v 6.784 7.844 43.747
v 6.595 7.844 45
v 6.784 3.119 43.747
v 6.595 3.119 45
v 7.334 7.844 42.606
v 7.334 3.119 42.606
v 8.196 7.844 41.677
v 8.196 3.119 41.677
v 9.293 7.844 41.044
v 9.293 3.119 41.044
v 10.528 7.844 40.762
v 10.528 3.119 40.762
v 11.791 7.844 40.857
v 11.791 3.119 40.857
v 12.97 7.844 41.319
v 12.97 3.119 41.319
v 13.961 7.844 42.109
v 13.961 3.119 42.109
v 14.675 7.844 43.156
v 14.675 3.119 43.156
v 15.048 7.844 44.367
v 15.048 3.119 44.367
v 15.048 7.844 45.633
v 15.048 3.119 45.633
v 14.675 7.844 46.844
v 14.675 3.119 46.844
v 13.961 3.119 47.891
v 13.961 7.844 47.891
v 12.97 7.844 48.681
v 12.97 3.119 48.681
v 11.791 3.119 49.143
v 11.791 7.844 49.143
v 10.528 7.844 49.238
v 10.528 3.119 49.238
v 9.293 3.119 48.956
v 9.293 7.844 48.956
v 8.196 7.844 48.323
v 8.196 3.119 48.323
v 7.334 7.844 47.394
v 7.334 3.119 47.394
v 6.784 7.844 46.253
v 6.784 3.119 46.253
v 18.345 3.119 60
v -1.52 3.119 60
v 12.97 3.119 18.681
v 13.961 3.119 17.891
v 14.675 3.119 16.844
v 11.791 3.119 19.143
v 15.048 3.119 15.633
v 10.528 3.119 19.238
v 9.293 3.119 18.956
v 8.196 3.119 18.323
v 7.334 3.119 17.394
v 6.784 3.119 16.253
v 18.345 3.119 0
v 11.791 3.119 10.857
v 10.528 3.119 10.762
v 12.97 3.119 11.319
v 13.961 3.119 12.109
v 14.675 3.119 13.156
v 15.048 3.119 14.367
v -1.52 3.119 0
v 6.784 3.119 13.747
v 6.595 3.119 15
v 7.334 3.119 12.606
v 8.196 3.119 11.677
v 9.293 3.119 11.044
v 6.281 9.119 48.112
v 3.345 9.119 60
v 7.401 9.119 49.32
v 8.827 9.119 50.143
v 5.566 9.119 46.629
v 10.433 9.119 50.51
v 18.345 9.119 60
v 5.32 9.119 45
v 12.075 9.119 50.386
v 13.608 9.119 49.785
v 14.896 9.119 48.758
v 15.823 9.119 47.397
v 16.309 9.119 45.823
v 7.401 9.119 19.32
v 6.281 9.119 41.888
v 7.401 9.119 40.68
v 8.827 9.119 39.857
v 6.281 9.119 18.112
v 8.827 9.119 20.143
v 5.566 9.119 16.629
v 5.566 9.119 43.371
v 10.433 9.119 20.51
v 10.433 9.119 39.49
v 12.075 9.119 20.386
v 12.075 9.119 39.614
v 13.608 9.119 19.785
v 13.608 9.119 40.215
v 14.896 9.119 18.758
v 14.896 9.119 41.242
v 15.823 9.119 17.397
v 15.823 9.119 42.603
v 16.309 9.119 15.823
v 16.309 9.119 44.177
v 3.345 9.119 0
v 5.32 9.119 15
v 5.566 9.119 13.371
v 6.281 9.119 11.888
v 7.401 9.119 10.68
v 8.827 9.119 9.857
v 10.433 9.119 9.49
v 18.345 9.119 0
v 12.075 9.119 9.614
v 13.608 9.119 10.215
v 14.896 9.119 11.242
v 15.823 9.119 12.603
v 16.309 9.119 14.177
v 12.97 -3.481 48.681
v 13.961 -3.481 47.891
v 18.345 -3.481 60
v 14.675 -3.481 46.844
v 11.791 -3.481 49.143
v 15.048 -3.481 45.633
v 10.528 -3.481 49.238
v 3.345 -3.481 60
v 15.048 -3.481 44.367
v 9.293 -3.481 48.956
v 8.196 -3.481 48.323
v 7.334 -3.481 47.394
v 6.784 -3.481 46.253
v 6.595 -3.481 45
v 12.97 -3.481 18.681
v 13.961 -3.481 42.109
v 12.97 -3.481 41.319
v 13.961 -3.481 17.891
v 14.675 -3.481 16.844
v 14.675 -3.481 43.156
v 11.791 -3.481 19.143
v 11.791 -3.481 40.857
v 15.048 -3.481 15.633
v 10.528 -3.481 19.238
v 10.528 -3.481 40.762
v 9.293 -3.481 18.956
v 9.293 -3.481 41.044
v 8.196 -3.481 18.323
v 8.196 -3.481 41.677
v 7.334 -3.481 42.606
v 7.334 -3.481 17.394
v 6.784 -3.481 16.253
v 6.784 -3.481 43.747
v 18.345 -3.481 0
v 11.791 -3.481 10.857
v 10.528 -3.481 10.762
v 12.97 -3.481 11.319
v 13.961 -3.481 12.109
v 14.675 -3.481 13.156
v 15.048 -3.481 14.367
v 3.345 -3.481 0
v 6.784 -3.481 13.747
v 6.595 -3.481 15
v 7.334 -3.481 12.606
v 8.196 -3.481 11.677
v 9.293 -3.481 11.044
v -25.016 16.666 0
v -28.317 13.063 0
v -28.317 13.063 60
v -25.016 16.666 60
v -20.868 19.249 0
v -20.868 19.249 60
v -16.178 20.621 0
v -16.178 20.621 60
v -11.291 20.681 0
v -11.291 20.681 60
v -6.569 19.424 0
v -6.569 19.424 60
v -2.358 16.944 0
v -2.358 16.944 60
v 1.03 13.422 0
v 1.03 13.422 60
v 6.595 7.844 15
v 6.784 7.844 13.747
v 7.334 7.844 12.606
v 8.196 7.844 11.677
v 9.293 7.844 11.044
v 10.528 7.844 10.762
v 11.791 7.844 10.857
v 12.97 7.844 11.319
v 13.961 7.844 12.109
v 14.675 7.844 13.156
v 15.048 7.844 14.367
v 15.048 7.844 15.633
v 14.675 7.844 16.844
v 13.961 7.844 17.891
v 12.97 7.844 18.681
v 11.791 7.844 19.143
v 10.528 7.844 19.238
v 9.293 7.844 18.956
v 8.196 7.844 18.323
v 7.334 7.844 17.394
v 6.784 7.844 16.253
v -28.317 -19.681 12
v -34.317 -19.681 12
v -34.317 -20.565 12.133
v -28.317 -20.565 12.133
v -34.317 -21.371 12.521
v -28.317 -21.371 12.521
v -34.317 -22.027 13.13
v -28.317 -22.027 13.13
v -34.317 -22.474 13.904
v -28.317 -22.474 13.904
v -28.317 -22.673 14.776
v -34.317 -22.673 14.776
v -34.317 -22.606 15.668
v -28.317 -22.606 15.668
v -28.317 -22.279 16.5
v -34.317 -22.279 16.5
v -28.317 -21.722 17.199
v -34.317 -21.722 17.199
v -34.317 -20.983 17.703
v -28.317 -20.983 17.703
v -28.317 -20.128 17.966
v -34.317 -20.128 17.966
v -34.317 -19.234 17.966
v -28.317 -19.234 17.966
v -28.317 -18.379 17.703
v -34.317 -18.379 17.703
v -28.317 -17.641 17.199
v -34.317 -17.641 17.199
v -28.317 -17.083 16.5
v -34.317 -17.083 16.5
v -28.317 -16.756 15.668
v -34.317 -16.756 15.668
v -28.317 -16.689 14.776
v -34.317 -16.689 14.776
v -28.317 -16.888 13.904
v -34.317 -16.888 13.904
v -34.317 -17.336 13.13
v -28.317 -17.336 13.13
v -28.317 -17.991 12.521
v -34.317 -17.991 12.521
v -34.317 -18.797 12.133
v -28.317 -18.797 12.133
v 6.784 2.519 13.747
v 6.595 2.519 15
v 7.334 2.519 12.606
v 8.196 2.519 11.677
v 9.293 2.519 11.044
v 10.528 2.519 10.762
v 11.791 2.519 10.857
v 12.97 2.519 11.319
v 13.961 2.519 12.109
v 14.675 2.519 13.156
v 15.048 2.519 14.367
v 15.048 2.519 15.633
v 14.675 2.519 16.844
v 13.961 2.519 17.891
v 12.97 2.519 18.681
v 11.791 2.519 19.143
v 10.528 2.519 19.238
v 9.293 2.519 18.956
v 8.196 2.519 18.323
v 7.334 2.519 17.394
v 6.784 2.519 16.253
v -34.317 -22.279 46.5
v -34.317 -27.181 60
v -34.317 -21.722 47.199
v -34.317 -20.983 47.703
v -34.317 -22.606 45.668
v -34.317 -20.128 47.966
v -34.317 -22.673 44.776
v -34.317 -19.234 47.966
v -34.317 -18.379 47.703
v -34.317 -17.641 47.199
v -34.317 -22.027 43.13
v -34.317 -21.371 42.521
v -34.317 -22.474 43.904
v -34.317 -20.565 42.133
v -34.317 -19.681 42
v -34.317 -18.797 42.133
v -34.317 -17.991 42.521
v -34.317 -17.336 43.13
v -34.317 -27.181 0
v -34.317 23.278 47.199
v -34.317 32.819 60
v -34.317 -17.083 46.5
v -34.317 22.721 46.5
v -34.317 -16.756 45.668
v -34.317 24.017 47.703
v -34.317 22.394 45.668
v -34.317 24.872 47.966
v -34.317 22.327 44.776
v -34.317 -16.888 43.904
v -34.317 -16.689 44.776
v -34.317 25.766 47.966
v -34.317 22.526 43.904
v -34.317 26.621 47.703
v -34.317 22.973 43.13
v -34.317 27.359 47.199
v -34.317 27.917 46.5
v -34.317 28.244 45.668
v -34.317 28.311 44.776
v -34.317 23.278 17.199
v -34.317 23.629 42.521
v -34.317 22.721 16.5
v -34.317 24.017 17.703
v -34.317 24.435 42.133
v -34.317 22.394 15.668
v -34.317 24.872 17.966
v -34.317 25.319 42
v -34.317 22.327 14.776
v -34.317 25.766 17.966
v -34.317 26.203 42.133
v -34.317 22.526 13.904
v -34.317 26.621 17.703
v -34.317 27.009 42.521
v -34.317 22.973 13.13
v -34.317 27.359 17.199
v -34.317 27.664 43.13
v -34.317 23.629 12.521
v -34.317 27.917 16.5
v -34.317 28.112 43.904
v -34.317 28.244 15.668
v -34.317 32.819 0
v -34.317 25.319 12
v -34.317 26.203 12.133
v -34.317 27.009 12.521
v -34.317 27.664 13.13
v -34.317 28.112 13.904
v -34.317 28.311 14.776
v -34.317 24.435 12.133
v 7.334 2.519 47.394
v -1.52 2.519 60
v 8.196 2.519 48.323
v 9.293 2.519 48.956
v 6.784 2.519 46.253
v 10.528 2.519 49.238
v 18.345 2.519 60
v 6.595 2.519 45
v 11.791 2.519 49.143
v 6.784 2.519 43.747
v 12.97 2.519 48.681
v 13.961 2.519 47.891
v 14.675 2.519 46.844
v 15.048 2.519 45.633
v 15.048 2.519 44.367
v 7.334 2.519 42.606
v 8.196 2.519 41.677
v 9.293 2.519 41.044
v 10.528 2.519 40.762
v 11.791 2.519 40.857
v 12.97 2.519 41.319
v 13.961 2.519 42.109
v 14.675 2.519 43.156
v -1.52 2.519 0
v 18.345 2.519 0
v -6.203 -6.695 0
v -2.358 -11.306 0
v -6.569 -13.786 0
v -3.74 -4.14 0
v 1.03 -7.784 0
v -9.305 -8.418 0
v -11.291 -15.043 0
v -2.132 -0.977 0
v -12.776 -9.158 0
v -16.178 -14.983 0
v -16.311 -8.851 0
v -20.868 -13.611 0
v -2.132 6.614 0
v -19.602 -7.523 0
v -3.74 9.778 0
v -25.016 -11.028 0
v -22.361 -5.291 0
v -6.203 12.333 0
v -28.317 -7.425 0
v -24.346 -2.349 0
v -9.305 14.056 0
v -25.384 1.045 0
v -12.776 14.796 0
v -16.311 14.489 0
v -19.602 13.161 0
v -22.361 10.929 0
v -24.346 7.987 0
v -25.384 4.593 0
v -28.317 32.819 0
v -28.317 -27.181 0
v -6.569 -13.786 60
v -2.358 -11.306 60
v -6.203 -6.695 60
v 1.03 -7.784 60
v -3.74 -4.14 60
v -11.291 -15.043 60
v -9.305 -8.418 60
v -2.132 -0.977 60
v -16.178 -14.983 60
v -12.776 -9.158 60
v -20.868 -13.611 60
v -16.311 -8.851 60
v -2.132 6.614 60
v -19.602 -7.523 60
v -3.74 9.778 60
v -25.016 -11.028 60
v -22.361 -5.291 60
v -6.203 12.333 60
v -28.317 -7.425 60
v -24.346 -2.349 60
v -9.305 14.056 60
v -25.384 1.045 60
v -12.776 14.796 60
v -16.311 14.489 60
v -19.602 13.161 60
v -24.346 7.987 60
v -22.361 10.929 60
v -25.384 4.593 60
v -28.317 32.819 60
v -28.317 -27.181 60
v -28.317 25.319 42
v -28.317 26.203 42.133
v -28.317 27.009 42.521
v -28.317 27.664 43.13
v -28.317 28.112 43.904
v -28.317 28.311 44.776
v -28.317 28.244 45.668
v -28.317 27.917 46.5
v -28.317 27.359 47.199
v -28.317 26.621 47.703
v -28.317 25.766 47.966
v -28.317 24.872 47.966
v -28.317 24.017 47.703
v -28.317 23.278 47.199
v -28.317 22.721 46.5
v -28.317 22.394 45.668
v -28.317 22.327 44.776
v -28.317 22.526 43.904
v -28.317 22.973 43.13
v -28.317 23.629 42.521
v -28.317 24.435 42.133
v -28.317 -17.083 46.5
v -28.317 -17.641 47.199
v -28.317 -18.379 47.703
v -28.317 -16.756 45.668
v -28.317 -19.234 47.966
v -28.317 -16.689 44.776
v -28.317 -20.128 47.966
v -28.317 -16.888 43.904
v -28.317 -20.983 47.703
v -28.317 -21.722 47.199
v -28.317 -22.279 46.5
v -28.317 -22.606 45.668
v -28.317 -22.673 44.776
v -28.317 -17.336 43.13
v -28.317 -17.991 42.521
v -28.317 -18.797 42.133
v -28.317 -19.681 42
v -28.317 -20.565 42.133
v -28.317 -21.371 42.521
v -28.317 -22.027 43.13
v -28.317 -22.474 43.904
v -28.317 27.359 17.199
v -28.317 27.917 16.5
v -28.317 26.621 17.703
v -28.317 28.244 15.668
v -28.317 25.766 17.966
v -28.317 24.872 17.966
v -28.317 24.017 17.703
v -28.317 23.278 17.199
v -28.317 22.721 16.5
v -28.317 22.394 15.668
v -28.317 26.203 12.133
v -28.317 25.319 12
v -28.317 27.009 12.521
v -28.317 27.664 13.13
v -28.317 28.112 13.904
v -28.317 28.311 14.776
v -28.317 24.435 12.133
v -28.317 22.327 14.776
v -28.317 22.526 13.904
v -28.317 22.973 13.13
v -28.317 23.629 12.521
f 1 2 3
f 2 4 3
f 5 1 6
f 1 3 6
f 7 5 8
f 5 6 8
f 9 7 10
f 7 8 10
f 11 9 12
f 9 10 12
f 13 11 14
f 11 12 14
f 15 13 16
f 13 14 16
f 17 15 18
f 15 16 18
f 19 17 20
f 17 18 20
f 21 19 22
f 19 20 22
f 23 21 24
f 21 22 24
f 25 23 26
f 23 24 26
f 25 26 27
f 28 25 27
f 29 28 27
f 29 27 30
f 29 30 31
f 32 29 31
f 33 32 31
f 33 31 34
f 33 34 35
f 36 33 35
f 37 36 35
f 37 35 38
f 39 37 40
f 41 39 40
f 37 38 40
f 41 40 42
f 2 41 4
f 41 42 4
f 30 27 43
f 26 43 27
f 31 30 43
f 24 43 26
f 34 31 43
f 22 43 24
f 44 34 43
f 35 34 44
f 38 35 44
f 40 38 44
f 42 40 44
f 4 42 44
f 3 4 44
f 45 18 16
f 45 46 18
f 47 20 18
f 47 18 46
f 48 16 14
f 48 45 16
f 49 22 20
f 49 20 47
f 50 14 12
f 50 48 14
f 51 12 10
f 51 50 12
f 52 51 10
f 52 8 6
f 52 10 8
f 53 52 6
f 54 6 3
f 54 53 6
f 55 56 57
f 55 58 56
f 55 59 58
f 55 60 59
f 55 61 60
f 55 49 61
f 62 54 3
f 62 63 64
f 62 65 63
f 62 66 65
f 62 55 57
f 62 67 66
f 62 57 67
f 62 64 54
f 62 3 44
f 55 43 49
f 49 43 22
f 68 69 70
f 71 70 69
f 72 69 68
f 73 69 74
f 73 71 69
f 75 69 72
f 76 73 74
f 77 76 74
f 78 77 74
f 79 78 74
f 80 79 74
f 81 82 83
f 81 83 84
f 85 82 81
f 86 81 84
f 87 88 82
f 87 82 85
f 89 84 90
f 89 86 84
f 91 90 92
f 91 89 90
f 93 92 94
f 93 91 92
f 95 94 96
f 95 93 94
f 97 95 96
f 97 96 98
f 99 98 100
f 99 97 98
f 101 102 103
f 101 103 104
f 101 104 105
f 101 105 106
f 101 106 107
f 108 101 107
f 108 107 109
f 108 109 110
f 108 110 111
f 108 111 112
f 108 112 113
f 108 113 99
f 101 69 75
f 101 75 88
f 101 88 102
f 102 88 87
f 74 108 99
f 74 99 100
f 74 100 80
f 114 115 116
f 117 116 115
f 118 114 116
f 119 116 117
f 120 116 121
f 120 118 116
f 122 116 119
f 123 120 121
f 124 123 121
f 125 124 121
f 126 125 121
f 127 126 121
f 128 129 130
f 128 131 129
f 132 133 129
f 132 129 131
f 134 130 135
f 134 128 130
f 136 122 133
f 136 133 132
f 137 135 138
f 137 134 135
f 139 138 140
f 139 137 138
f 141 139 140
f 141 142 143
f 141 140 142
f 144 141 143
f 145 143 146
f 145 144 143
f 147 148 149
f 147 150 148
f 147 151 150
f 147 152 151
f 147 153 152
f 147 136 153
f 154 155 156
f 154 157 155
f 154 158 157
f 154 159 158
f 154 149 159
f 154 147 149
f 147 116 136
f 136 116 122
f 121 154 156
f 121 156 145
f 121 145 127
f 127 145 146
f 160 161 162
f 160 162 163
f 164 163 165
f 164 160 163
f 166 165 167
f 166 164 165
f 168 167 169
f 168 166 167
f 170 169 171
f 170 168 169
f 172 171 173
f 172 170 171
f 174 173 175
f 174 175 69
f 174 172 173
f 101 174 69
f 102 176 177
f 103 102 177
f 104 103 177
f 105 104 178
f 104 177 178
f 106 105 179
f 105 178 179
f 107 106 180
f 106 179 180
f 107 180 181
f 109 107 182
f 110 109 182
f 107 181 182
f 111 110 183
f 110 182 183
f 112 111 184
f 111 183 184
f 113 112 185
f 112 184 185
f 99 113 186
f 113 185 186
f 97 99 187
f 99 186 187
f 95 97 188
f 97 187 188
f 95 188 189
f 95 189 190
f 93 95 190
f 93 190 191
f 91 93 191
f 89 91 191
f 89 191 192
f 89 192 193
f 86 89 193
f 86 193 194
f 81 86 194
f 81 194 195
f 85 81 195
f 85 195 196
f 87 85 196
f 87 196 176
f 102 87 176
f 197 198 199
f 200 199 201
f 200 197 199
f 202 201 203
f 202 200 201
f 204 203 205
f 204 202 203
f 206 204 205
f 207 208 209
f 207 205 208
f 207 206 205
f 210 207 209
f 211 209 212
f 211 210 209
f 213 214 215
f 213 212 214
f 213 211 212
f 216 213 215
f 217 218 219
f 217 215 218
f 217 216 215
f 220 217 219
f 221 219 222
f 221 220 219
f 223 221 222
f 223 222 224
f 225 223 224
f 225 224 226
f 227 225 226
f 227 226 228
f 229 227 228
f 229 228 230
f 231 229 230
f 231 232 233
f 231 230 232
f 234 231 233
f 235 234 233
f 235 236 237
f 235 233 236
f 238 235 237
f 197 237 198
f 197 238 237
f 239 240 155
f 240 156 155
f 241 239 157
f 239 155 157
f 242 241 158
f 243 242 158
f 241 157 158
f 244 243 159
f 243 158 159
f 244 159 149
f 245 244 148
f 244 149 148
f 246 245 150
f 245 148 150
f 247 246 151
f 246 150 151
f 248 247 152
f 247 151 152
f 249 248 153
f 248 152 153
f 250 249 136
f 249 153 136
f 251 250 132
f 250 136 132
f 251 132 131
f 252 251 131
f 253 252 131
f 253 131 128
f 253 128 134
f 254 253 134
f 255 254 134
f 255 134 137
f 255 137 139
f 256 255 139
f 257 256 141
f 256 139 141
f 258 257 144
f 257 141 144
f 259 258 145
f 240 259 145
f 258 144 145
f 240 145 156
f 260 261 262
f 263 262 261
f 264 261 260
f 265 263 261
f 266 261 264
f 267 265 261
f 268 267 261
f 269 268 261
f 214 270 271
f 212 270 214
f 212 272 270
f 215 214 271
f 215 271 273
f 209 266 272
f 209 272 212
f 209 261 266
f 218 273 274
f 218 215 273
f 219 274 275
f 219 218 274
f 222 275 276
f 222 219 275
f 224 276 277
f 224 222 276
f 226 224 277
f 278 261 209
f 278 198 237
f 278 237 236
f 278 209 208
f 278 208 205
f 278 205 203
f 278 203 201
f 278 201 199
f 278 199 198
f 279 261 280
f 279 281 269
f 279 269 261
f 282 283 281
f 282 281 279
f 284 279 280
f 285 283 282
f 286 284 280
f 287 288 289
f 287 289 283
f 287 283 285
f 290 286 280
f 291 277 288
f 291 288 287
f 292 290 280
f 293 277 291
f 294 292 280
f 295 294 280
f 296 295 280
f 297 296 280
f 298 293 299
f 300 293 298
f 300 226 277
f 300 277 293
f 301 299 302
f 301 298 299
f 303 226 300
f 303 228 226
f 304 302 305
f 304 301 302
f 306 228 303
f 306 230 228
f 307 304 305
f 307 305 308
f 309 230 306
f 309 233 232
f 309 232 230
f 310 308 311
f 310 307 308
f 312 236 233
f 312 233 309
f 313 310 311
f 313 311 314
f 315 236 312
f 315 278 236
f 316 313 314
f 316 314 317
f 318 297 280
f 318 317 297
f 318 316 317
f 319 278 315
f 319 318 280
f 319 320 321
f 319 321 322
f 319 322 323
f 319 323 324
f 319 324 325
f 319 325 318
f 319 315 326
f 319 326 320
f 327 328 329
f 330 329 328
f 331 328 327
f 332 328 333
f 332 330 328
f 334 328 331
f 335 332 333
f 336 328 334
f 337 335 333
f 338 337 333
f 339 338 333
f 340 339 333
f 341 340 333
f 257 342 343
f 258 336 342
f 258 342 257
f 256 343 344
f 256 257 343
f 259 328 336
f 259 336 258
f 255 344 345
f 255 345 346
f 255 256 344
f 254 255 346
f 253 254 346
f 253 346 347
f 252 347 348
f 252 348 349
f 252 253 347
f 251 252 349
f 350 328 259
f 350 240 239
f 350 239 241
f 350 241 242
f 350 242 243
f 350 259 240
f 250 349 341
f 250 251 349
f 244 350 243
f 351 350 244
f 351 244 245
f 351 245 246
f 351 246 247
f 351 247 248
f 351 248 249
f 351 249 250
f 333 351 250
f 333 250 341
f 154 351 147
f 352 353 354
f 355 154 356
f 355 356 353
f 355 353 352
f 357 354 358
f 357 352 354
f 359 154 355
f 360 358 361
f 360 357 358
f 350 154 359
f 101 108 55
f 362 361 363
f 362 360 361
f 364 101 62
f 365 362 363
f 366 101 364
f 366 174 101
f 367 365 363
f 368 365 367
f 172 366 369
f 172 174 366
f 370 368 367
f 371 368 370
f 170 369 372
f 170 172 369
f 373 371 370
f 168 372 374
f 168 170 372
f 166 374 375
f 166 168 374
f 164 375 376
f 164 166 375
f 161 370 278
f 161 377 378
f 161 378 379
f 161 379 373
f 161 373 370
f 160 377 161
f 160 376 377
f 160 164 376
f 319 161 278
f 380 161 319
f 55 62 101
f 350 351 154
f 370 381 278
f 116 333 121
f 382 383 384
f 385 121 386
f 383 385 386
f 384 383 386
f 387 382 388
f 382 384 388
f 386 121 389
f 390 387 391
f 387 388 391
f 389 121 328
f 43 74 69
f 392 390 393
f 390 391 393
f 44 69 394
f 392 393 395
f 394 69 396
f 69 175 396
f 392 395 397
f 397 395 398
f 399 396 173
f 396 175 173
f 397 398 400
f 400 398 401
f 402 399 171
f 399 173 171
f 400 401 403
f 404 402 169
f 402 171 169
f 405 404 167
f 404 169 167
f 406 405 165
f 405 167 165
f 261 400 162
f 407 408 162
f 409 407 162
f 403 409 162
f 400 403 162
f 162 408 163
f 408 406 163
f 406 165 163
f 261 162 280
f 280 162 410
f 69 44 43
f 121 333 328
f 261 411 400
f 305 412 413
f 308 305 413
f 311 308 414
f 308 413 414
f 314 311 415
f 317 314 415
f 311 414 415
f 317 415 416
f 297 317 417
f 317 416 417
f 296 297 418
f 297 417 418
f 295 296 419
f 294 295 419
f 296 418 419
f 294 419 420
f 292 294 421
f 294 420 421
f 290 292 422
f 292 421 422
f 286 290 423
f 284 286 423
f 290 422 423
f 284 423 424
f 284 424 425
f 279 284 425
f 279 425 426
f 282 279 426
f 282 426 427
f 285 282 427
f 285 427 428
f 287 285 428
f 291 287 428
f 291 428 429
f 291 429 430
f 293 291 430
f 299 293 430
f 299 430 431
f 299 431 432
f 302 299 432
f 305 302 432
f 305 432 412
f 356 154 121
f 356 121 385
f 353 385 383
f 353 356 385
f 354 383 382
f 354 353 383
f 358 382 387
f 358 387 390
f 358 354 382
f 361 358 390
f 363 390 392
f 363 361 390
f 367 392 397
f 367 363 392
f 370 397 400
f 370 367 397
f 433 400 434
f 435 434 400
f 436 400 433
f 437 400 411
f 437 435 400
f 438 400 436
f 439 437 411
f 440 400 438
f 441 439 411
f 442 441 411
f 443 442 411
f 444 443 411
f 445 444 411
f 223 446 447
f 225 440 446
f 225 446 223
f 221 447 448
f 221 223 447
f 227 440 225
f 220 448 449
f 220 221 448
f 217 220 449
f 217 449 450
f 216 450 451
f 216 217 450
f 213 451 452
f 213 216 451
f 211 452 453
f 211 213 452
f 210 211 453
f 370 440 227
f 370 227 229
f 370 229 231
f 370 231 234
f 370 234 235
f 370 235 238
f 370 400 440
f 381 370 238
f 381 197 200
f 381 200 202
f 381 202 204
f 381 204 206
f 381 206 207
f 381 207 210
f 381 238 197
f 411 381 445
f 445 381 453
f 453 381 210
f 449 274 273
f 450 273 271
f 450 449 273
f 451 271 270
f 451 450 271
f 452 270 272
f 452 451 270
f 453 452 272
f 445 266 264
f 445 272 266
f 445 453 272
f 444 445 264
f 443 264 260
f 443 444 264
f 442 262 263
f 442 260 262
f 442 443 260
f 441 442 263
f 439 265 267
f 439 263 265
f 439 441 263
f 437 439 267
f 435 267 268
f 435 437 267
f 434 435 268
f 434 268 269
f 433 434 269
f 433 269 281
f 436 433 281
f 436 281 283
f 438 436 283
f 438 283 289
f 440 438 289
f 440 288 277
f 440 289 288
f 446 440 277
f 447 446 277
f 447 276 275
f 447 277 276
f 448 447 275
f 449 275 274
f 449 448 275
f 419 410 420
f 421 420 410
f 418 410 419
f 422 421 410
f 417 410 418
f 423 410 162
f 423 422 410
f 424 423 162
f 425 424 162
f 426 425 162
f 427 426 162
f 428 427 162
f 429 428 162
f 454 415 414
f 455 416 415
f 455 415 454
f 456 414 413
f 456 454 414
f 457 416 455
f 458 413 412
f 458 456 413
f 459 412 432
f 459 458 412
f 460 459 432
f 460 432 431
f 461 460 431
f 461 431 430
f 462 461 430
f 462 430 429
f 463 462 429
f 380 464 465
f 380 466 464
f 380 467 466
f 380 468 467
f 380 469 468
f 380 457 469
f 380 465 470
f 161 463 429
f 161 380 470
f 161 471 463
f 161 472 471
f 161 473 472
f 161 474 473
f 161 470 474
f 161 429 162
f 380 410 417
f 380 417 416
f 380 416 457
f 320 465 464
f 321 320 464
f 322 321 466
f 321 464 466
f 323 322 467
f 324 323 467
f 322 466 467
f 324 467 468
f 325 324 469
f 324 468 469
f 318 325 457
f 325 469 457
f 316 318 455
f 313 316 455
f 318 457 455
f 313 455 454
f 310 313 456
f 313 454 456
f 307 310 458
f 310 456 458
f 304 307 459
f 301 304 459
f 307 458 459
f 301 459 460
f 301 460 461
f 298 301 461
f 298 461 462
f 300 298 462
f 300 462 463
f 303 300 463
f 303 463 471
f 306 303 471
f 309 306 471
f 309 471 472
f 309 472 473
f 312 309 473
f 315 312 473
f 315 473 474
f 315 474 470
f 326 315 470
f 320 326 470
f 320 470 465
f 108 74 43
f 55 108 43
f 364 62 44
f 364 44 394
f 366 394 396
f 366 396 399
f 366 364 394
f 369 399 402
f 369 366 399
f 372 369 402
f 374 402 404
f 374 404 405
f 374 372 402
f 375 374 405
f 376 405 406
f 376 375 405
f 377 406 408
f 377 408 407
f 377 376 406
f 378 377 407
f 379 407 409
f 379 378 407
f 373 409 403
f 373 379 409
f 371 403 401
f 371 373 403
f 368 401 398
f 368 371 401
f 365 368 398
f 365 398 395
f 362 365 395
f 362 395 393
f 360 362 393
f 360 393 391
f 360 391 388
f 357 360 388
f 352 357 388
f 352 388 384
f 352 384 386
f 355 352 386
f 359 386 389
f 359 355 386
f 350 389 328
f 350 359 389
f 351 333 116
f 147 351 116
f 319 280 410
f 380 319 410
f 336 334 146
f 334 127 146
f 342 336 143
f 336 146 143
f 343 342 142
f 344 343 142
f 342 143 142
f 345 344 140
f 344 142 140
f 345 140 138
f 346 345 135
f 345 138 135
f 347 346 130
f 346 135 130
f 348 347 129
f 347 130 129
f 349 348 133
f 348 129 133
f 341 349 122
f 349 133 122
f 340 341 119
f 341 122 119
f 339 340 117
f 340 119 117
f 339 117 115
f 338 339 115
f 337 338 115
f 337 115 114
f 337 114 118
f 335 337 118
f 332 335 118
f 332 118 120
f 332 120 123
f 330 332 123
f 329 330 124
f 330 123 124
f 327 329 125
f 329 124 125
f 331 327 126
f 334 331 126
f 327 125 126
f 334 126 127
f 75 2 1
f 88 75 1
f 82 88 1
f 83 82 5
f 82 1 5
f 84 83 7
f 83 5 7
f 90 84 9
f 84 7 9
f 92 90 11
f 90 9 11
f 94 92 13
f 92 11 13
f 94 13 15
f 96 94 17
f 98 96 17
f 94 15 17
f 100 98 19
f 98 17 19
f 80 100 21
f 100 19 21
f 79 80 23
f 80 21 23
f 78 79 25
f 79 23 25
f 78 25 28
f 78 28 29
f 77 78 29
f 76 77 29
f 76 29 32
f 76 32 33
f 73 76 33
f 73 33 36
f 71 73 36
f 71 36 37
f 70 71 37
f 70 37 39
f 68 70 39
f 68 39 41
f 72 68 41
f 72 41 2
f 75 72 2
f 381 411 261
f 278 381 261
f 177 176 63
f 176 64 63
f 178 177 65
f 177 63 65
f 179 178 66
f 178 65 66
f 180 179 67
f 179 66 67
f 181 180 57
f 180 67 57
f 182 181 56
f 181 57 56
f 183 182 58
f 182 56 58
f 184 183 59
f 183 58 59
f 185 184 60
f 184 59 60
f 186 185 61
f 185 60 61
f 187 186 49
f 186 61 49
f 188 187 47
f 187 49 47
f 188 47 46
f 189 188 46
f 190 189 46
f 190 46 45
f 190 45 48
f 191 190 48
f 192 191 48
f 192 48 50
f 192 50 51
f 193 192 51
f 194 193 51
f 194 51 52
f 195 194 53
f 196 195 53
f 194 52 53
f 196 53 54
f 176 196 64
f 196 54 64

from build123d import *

# Parameters (mm, degrees)
EXTRUDE_1_DEPTH               = 60
SKETCH_2_R                    = 3
CUT_EXTRUDE_1_DEPTH           = 83.791703555
HOLE_WIZARD_M10_1_D           = 8.5
HOLE_WIZARD_M10_1_DEPTH       = 27.5
HOLE_WIZARD_M10_1_CSINK_D     = 11.05
HOLE_WIZARD_M10_1_CSINK_ANGLE = 90
HOLE_WIZARD_M10_1_TIP         = 2.553657631


with BuildPart() as part:
    # 草图1 → 凸台-拉伸1 (new body)
    with BuildSketch(Plane.XY):
        with BuildLine():
            Line((-34.31692533, -27.181035016), (-34.31692533, 32.818964984))
            Line((-34.31692533, 32.818964984), (-28.31692533, 32.818964984))
            Line((-28.31692533, 32.818964984), (-28.31692533, 13.062622536))
            ThreePointArc((-28.31692533, 13.062622536), (-11.291229121, 20.680947179), (3.345497613, 9.118964984))
            Line((3.345497613, 9.118964984), (18.345497613, 9.118964984))
            Line((18.345497613, 9.118964984), (18.345497613, 3.118964984))
            Line((18.345497613, 3.118964984), (-1.519747569, 3.118964984))
            ThreePointArc((-1.519747569, 3.118964984), (-25.515996982, 2.818964984), (-1.519747569, 2.518964984))
            Line((-1.519747569, 2.518964984), (18.345497613, 2.518964984))
            Line((18.345497613, 2.518964984), (18.345497613, -3.481035016))
            Line((18.345497613, -3.481035016), (3.345497613, -3.481035016))
            ThreePointArc((3.345497613, -3.481035016), (-11.291229121, -15.043017212), (-28.31692533, -7.424692569))
            Line((-28.31692533, -7.424692569), (-28.31692533, -27.181035016))
            Line((-28.31692533, -27.181035016), (-34.31692533, -27.181035016))
        make_face()
    extrude(amount=EXTRUDE_1_DEPTH)

    # 草图2 → 切除-拉伸1 (cut, through all)
    with BuildSketch(Plane(origin=(-28.31692533, 0, 0), x_dir=(0, 0, -1), z_dir=(1, 0, 0))):
        with Locations((-45, 25.318964984)):
            Circle(SKETCH_2_R)
        with Locations((-15, 25.318964984)):
            Circle(SKETCH_2_R)
    cut_extrude_1 = extrude(amount=-CUT_EXTRUDE_1_DEPTH, mode=Mode.SUBTRACT)

    # 镜向3: 切除-拉伸1 across plane
    add(cut_extrude_1.mirror(Plane.ZX.offset(2.818964984)), mode=Mode.SUBTRACT)

    # M10 螺纹孔1
    with Locations(Plane(origin=(10.845497613, 9.118964984, 15), x_dir=(1, 0, 0), z_dir=(0, 1, 0))):
        with Locations((0, 0), (0, -30)):
            CounterSinkHole(HOLE_WIZARD_M10_1_D / 2, HOLE_WIZARD_M10_1_CSINK_D / 2, depth=HOLE_WIZARD_M10_1_DEPTH, counter_sink_angle=HOLE_WIZARD_M10_1_CSINK_ANGLE)
            with Locations((0, 0, -(HOLE_WIZARD_M10_1_DEPTH + HOLE_WIZARD_M10_1_TIP / 2))):  # 118° drill point
                Cone(0, HOLE_WIZARD_M10_1_D / 2, HOLE_WIZARD_M10_1_TIP, mode=Mode.SUBTRACT)


solid = part.part
